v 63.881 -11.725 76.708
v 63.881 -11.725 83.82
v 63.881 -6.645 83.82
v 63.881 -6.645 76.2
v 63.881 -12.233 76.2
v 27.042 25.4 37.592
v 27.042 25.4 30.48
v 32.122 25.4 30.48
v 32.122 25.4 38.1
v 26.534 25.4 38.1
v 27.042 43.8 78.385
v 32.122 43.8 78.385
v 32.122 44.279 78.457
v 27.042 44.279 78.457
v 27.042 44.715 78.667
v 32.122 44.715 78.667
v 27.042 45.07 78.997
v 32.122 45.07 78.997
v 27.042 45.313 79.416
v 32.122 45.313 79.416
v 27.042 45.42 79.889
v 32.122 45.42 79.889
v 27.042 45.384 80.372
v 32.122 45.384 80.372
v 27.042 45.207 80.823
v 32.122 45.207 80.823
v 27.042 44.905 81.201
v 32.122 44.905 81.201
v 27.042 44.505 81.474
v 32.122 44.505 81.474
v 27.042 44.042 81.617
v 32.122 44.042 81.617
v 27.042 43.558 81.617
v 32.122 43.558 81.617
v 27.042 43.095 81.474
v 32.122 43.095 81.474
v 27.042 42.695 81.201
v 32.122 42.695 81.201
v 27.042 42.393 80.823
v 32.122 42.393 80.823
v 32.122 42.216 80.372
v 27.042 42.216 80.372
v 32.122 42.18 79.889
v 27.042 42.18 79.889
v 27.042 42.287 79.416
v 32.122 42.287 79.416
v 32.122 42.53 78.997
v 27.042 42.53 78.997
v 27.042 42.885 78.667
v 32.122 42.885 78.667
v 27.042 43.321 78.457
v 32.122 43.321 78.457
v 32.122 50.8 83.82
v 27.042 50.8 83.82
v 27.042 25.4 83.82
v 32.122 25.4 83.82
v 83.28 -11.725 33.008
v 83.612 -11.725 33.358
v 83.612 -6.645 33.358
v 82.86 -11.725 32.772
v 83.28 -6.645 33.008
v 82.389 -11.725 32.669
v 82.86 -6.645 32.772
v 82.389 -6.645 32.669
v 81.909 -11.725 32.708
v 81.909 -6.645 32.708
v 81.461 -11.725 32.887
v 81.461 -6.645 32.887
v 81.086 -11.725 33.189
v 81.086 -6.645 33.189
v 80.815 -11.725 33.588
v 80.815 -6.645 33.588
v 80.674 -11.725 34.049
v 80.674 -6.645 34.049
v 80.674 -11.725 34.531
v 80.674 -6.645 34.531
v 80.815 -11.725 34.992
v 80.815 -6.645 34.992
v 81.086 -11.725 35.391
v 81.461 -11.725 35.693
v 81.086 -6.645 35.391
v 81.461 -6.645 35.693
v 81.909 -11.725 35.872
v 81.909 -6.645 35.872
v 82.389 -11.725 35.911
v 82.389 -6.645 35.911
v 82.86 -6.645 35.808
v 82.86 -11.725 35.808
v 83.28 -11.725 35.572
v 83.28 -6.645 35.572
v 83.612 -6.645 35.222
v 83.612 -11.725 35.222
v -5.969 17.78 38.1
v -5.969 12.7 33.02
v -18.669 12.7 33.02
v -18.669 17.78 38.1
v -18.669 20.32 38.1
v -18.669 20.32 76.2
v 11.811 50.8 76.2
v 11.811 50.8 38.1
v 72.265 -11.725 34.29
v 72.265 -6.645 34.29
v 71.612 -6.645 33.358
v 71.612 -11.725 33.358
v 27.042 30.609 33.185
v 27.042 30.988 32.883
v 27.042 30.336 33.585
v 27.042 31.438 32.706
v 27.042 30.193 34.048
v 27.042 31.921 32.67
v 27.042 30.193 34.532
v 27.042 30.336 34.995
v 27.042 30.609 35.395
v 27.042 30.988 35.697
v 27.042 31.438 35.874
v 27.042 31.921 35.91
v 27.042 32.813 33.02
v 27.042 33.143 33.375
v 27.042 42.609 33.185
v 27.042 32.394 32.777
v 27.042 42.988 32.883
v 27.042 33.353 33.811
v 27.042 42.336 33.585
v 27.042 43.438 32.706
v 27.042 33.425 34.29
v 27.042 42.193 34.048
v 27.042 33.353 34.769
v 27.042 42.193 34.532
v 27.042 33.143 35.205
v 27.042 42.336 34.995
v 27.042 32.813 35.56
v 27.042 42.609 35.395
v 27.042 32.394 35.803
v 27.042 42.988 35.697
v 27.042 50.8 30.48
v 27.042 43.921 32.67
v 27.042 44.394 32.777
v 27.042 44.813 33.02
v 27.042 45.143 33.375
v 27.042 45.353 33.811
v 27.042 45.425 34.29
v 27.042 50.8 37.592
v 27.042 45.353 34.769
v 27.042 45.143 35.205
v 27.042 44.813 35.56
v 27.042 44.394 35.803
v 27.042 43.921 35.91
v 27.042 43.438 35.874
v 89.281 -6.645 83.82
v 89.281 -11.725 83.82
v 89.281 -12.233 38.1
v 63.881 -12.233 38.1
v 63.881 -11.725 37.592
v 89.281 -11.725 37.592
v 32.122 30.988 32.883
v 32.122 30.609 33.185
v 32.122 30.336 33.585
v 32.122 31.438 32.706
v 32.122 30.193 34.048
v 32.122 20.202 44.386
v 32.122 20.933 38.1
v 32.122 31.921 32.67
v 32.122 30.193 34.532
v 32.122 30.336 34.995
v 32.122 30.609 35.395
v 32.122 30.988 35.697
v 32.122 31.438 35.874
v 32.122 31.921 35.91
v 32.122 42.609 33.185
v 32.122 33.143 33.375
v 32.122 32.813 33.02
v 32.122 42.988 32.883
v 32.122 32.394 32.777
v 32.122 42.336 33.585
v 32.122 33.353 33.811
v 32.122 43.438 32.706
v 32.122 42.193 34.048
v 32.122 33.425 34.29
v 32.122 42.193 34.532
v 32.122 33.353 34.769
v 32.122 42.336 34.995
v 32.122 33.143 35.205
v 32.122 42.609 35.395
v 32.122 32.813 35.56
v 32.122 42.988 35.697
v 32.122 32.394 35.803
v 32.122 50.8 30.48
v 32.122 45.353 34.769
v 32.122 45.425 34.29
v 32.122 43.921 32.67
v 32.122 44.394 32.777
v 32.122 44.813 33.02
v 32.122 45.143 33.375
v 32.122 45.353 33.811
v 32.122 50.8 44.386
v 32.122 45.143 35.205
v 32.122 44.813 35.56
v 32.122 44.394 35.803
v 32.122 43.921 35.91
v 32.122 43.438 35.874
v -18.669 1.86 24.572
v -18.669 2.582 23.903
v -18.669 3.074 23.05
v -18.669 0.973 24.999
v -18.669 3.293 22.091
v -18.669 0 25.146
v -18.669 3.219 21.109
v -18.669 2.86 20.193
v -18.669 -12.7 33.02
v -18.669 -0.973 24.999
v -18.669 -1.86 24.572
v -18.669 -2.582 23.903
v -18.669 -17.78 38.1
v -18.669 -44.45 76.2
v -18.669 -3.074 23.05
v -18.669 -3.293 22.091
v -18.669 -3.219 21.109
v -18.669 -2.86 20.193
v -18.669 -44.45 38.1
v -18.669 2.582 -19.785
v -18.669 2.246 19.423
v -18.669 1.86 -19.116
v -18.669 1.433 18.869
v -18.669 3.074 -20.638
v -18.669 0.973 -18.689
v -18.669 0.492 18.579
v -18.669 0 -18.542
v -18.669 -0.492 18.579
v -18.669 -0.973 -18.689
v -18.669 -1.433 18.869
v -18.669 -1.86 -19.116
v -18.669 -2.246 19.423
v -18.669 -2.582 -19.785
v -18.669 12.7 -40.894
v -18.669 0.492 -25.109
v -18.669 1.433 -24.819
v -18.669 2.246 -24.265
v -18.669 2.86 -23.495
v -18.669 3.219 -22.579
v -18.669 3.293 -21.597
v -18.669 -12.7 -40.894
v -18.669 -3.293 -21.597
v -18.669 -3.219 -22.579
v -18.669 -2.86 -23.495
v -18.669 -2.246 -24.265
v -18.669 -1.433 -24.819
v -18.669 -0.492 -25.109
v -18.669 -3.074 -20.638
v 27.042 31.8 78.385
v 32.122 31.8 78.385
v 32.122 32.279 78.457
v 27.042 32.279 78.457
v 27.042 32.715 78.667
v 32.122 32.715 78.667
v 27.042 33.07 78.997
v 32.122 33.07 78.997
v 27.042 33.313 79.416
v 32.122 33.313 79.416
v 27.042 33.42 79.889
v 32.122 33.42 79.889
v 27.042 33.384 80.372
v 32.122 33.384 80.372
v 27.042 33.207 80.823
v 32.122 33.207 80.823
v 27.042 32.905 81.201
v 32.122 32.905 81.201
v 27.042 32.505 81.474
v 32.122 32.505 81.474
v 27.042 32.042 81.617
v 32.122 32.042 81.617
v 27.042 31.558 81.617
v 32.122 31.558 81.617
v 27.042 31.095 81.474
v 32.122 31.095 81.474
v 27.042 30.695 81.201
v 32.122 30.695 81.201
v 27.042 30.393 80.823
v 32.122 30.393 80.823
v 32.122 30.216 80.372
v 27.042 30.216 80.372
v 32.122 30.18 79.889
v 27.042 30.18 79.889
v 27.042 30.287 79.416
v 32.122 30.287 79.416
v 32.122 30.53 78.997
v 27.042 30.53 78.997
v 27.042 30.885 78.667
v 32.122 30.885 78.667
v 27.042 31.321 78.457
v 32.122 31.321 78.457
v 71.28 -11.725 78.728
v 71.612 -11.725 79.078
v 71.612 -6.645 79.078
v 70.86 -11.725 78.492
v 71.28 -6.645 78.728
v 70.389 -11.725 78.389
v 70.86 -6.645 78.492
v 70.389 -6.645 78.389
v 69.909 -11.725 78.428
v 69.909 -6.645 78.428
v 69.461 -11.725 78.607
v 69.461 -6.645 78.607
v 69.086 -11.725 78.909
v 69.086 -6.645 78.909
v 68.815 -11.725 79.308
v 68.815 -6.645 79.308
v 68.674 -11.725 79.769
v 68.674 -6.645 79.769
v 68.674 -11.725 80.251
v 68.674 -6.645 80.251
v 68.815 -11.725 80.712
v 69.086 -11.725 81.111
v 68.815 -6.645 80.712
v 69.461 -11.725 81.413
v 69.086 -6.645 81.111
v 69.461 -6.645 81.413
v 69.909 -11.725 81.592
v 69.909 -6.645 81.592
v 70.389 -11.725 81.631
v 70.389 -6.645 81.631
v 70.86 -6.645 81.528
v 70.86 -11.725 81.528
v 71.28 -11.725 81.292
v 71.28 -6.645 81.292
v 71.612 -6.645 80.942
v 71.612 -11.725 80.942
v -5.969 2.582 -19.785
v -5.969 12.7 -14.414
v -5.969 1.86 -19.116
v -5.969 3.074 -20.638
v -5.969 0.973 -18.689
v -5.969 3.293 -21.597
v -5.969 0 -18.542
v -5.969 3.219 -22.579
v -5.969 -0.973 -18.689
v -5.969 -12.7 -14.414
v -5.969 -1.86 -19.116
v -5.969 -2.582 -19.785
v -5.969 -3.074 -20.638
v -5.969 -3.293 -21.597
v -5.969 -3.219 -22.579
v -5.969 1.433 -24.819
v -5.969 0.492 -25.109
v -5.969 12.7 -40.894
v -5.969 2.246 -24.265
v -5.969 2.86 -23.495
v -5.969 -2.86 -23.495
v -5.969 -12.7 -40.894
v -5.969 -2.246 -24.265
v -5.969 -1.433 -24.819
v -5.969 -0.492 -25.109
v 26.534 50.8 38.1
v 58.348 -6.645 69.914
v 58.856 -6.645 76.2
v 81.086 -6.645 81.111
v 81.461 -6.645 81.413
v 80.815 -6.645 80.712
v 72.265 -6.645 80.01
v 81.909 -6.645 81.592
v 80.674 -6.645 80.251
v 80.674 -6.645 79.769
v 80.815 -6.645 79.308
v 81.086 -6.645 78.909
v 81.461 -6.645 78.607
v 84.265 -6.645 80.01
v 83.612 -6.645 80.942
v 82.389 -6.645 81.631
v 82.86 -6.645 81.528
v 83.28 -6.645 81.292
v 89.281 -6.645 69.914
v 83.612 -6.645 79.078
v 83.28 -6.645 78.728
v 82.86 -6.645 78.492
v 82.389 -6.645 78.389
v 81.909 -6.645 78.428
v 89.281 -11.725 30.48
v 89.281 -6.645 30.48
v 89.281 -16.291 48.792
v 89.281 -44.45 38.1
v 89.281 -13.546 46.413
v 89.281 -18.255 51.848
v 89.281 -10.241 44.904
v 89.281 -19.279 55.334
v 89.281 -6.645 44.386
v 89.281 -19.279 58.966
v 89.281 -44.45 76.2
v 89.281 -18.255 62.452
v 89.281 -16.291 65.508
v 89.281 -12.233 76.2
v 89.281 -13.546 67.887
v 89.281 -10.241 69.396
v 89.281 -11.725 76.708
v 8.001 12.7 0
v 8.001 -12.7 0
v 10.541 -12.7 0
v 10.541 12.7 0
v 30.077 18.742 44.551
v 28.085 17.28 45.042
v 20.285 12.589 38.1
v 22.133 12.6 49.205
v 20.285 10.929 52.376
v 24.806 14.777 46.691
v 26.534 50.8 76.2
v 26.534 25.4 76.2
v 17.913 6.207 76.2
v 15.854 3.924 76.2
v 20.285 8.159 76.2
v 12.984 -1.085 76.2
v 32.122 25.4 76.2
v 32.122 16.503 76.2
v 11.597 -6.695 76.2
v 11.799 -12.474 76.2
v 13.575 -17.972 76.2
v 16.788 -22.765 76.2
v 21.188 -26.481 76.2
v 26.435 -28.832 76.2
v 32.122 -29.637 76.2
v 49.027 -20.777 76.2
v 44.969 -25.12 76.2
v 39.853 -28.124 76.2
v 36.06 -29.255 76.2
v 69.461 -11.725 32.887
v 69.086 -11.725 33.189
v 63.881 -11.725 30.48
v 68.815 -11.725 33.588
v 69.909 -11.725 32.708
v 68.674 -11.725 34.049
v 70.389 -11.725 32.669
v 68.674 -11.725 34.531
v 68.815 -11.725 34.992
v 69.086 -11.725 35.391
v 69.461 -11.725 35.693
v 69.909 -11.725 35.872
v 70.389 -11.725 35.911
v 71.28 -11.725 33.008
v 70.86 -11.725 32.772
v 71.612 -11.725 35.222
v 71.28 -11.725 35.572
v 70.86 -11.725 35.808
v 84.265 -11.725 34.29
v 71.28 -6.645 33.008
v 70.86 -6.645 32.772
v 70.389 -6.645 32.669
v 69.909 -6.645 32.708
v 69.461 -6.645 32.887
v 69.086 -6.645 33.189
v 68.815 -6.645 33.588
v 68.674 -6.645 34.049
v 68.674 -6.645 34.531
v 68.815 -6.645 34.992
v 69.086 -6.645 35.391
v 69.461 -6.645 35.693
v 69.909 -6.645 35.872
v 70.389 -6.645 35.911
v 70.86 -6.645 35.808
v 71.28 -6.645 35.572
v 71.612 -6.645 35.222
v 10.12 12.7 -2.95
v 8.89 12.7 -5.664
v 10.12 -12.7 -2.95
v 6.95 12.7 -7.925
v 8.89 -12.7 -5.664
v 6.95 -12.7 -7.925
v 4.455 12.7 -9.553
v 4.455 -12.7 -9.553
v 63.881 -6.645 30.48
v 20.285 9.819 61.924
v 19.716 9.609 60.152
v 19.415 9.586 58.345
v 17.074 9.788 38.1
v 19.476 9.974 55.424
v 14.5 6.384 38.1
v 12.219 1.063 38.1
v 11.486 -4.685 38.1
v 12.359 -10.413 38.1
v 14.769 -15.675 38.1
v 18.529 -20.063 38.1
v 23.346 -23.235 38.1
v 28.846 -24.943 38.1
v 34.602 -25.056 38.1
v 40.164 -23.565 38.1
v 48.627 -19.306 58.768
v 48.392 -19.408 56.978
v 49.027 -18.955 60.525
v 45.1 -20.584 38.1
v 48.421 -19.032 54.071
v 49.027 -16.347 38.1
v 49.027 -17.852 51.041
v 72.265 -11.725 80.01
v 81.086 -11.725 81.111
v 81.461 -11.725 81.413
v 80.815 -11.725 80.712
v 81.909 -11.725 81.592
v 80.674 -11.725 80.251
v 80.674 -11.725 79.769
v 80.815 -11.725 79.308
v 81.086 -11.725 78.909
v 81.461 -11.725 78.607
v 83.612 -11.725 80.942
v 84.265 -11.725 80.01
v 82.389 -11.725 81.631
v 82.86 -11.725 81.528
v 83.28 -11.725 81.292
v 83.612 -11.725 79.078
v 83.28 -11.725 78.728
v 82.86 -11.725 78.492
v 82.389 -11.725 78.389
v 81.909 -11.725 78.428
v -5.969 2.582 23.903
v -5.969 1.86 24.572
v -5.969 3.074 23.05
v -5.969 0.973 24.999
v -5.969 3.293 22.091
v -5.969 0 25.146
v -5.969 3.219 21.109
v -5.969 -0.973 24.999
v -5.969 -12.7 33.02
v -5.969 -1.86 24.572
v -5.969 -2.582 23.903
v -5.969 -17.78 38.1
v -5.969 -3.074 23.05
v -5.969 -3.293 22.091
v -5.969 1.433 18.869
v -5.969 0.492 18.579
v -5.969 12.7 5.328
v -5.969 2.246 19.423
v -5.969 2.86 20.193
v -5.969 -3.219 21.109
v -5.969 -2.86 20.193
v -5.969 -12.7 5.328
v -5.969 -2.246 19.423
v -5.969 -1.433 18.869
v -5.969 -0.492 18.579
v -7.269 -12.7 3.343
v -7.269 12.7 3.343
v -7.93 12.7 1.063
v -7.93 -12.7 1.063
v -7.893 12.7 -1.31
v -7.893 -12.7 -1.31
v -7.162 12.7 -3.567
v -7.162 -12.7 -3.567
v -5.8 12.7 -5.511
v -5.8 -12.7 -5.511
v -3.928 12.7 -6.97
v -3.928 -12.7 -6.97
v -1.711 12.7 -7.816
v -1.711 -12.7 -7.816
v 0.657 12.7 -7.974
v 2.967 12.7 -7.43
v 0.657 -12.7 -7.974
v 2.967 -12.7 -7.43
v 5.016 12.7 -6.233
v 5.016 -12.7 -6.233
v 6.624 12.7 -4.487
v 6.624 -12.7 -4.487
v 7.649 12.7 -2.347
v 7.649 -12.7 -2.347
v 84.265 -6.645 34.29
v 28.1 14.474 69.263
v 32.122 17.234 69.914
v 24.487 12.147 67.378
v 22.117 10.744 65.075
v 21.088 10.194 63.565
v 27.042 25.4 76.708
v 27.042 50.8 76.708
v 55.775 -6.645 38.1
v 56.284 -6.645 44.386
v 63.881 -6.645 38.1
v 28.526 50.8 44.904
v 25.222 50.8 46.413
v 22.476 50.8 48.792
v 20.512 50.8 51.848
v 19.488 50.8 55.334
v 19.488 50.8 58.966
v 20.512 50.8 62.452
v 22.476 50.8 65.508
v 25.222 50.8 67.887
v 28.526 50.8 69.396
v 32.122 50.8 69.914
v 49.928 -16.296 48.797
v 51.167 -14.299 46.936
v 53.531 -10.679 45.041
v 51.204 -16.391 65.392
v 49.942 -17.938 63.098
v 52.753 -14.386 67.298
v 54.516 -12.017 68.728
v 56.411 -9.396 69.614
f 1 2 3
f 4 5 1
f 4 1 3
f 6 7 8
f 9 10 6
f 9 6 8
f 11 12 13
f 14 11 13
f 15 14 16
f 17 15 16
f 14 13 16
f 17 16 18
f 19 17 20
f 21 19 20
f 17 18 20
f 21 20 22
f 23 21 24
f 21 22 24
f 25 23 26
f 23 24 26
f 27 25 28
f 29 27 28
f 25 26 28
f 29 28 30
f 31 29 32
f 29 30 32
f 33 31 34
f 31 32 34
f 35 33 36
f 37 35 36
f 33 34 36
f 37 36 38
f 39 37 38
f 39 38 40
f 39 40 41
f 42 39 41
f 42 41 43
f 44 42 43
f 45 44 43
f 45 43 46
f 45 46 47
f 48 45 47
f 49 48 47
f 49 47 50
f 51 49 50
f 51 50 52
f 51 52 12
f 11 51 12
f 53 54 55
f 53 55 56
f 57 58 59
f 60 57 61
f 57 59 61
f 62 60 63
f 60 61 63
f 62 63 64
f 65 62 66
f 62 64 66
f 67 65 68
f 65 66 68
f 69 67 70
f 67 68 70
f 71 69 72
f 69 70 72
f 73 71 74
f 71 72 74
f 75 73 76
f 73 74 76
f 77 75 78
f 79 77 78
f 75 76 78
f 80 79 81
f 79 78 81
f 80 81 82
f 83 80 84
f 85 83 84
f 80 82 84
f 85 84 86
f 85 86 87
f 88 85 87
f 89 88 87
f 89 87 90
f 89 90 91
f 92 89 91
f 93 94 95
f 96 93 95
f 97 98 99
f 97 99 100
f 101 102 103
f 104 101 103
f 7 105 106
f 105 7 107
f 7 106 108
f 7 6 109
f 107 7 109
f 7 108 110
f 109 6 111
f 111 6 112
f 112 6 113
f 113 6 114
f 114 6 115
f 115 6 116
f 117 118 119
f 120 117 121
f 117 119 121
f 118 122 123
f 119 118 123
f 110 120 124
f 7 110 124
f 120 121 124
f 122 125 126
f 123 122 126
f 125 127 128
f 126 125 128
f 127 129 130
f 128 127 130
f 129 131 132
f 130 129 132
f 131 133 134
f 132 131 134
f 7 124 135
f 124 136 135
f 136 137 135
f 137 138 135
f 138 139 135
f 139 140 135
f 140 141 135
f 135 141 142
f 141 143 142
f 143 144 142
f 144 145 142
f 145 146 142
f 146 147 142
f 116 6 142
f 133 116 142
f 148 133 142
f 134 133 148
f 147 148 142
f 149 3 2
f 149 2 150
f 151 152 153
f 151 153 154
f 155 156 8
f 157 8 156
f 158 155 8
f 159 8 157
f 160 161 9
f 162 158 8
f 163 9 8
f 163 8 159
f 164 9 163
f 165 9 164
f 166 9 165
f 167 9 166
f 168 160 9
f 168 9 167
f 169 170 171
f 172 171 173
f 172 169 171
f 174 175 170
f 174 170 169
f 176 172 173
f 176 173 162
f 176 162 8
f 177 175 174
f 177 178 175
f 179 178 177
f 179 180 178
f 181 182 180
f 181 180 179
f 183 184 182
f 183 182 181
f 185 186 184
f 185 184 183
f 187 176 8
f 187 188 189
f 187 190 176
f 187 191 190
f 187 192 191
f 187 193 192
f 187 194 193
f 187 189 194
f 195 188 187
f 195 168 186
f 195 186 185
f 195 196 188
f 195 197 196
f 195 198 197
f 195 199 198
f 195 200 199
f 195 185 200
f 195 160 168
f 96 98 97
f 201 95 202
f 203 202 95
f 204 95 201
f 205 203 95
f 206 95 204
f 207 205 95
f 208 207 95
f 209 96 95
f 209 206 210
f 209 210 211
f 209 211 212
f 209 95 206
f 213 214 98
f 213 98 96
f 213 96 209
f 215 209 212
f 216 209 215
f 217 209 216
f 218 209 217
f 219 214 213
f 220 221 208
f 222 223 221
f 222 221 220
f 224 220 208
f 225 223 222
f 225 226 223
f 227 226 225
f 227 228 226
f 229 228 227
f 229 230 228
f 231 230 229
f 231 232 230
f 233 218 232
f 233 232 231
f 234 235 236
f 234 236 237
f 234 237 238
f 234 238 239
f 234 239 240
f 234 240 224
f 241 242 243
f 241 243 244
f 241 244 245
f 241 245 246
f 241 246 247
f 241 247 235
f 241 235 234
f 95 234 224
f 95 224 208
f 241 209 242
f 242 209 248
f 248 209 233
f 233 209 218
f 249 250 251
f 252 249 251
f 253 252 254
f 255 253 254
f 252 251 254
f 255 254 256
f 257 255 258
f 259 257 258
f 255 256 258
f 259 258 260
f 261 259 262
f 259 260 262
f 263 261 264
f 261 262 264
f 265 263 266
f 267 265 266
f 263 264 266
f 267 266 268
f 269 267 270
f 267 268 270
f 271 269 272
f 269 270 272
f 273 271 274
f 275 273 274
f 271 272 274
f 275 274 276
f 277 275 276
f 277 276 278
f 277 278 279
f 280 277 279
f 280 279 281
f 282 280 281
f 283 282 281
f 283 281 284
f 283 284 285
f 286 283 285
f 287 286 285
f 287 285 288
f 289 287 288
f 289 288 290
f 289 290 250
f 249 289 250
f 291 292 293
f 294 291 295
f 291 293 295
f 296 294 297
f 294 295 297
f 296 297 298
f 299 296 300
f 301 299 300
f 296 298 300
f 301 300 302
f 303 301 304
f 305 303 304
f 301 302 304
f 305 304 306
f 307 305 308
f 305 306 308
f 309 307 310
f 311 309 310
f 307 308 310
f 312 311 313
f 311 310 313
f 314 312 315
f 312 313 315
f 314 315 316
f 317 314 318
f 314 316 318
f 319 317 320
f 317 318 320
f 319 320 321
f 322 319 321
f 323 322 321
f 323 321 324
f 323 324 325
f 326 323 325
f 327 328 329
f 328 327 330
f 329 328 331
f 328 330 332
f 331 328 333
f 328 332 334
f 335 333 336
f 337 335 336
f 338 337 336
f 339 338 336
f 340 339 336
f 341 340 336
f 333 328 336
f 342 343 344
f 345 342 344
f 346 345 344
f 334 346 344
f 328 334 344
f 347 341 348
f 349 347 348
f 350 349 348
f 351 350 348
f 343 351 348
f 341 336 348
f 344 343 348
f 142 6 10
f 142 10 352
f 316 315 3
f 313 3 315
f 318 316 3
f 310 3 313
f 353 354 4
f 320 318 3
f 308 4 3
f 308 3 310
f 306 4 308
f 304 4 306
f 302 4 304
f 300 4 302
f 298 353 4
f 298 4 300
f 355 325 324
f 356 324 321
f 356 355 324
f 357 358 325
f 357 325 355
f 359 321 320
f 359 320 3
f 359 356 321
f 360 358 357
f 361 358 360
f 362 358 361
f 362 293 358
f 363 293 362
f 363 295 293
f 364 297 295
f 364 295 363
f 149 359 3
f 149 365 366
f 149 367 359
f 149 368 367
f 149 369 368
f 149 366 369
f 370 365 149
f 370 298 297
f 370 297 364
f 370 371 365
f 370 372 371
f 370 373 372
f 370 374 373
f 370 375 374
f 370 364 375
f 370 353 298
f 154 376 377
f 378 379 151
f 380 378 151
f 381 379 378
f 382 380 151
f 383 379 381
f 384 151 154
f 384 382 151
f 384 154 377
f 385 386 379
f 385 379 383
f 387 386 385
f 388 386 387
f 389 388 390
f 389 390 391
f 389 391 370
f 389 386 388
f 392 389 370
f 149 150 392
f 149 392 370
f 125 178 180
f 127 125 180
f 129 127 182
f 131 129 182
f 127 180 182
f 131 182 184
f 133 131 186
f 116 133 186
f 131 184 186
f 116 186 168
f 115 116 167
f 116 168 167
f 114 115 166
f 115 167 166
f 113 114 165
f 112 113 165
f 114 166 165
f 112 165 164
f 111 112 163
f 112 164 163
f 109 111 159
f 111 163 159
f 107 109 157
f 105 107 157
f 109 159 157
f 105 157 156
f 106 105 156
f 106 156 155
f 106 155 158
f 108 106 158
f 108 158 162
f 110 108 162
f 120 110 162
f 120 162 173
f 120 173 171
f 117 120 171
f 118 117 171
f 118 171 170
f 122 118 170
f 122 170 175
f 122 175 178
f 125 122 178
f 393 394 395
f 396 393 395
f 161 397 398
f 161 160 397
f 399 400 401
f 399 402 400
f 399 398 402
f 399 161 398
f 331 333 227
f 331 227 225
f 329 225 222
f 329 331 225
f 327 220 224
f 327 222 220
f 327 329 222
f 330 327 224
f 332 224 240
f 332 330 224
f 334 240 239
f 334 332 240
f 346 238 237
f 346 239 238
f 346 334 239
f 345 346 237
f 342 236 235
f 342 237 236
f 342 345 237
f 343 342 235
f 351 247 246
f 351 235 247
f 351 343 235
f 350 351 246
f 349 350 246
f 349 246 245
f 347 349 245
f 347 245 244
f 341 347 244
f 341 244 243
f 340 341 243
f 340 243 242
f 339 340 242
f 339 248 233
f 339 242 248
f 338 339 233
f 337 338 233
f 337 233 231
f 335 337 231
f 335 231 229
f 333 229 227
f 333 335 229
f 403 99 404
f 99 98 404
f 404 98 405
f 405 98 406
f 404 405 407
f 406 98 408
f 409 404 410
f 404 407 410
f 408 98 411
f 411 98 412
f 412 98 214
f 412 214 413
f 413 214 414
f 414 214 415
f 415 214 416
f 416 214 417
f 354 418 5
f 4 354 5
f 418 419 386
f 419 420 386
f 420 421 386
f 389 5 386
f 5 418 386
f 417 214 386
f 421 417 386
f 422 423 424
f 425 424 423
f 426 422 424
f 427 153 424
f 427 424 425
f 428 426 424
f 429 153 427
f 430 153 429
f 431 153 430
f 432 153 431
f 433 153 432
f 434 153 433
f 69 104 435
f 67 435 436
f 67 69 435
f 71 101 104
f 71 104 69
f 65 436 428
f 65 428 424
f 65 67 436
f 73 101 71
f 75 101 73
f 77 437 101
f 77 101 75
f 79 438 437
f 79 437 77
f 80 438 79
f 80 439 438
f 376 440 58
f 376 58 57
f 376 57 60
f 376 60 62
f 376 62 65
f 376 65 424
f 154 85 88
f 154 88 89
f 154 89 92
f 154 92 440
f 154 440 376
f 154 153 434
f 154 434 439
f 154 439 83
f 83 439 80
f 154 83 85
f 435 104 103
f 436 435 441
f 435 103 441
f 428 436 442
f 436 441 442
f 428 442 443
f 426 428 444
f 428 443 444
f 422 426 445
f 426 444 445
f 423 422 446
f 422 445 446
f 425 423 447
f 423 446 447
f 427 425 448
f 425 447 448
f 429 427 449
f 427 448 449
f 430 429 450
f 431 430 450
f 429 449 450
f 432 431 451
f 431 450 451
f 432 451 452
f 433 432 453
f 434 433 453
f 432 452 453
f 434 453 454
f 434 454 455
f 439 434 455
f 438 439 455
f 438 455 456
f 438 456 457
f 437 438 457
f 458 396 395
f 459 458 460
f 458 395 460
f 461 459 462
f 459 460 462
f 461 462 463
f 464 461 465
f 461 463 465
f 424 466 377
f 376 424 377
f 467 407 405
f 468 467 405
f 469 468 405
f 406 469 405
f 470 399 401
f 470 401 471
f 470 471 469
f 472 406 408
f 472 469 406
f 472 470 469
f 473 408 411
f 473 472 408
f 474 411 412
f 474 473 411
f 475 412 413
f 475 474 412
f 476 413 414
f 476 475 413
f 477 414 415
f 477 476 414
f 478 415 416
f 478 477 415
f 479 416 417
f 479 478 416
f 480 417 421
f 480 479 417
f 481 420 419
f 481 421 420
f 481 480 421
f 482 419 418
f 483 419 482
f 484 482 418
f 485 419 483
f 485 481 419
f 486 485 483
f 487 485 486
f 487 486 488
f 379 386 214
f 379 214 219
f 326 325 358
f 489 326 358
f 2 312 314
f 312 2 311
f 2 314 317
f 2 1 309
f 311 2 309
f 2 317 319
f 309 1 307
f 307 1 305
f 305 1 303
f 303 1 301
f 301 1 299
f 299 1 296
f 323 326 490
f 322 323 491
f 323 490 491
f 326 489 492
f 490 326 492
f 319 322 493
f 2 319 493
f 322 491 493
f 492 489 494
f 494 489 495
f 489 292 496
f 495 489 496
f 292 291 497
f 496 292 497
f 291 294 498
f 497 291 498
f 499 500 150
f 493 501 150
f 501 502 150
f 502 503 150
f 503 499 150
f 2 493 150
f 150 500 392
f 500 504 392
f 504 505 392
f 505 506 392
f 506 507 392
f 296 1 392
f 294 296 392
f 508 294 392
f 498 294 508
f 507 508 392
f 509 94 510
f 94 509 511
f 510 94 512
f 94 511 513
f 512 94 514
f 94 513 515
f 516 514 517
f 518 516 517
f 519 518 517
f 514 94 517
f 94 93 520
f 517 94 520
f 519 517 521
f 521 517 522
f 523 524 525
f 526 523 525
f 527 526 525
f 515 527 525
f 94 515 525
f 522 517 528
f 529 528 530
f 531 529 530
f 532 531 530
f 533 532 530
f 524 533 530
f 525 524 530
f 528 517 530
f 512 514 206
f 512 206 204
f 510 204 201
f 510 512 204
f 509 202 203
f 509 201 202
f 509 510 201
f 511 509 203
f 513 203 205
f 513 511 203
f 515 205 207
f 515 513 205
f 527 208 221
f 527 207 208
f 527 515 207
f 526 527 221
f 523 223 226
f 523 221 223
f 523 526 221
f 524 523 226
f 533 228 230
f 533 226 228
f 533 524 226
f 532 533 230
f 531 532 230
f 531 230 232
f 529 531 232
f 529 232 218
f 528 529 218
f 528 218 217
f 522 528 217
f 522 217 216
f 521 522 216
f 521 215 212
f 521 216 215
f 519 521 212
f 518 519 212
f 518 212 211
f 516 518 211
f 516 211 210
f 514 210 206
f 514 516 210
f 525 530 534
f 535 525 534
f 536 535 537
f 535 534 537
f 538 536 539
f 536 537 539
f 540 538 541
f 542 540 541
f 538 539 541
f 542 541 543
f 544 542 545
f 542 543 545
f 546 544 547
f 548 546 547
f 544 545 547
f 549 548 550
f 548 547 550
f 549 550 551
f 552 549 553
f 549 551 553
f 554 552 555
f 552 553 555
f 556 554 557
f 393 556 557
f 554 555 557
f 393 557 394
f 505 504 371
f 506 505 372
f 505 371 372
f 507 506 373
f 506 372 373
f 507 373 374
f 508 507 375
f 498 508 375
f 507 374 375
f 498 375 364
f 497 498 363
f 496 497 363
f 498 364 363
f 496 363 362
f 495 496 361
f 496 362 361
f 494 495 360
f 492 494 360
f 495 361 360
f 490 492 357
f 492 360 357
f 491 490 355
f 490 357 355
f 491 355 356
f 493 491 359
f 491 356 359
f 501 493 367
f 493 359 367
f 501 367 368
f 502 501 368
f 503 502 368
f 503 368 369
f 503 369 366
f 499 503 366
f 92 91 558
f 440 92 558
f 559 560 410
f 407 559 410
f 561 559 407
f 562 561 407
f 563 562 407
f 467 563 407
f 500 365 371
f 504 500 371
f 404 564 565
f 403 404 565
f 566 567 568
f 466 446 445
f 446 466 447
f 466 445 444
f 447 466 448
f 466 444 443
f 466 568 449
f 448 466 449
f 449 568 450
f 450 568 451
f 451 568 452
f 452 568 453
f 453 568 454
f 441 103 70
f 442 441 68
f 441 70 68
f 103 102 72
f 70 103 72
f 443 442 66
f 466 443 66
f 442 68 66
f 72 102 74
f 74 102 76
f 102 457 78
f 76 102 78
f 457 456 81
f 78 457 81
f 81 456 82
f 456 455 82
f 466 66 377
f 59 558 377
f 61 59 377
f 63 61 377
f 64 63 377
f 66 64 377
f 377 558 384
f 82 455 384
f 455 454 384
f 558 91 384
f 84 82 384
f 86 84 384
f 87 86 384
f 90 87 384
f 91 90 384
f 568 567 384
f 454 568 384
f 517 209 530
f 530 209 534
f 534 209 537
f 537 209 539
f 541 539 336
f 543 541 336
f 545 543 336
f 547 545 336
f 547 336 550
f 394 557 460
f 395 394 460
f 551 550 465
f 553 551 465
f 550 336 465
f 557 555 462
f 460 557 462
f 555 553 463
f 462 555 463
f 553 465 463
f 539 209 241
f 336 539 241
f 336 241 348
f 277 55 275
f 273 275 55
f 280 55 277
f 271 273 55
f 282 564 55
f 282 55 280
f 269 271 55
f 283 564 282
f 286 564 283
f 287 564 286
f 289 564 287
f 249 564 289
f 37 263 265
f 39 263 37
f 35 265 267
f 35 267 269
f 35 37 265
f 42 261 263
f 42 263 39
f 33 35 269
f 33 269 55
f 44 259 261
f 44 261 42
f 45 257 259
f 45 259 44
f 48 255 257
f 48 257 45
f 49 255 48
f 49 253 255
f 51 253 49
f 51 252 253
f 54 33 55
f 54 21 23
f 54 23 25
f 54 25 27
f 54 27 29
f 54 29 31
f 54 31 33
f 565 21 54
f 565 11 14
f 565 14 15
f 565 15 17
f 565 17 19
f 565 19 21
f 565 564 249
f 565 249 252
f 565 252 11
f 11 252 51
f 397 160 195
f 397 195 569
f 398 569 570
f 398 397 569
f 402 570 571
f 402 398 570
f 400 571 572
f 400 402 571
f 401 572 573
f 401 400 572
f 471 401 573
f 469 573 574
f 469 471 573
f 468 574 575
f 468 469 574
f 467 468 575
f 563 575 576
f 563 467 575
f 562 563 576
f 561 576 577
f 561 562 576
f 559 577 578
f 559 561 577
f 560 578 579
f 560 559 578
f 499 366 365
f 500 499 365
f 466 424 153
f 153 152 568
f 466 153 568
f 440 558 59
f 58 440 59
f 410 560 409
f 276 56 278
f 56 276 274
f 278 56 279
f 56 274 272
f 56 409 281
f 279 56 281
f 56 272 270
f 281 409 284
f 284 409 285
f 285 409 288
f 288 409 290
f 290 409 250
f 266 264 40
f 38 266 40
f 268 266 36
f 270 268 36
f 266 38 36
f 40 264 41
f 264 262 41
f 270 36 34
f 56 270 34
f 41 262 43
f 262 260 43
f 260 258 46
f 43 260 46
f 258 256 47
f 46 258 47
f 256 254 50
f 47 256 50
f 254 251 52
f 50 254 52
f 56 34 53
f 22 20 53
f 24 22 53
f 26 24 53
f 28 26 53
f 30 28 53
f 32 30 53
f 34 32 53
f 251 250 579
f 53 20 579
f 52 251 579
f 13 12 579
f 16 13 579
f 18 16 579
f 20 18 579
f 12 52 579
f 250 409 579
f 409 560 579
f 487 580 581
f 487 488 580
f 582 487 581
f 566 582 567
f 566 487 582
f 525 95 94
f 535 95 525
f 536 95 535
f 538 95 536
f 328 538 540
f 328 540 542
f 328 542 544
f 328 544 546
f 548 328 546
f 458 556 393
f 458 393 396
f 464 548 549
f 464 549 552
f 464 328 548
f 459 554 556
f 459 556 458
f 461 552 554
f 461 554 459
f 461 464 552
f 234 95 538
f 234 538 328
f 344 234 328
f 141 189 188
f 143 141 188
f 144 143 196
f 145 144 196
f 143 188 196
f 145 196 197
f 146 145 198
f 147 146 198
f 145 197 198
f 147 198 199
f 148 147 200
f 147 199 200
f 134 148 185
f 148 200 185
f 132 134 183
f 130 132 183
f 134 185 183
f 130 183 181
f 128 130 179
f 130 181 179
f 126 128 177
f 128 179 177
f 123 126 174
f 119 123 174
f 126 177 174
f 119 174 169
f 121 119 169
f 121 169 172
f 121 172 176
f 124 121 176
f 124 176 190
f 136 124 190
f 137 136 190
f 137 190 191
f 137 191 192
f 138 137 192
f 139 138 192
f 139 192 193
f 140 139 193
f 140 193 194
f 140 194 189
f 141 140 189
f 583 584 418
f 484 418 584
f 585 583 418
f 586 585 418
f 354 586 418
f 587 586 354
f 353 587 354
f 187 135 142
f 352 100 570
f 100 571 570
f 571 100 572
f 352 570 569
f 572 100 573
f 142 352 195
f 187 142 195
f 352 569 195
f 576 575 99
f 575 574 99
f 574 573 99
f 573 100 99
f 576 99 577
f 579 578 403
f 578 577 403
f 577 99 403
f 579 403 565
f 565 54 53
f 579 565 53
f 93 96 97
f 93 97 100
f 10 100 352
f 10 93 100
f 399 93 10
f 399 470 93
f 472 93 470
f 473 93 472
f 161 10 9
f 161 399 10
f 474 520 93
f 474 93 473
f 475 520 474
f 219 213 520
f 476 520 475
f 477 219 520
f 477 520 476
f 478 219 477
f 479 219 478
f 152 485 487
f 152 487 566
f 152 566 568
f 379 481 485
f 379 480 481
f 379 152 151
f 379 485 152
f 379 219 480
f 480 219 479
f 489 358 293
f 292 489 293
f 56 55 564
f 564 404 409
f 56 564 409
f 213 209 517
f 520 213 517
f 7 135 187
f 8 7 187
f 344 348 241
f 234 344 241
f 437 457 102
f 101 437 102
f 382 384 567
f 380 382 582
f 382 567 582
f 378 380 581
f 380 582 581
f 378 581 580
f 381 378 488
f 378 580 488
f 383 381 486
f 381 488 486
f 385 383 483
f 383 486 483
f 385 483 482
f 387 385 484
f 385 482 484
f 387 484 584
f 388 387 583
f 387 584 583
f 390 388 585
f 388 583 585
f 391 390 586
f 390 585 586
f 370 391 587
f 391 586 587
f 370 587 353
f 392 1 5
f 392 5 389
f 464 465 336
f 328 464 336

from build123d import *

# Parameters (mm, degrees)
BOSS_EXTRUDE1_DEPTH                       = 12.7
BOSS_EXTRUDE1_DEPTH_BACK                  = 12.7
CUT_EXTRUDE1_DEPTH                        = 83.589067678
CUT_EXTRUDE1_DEPTH_BACK                   = 83.589067678
SKETCH5_R                                 = 3.302
BOSS_EXTRUDE_START                        = -12.7
SKETCH10_W                                = 12.7
SKETCH10_H                                = 38.1
BOSS_EXTRUDE_ARM_FB_WIDTH_DEPTH           = 44.45
BOSS_EXTRUDE_ARM_CHASSIS_FB_DEPTH         = 95.25
SKETCH15_W                                = 55.88
SKETCH15_H                                = 38.1
BOSS_EXTRUDE_ARM_CHASSIS_LR_DEPTH         = 50.8
SKETCH16_R                                = 12.7635
CUT_EXTRUDE_CHASSIS_FB_DEPTH              = 128.199614864
SKETCH17_R                                = 12.7635
SKETCH17_W                                = 12.7635
SKETCH17_H                                = 38.1
CUT_EXTRUDE_CHASSIS_LR_DEPTH              = 128.199614864
CUT_EXTRUDE_START                         = -22.107857563
CUT_EXTRUDE_CHASSIS_JOINT_CLEARANCE_DEPTH = 43.685920391
SKETCH19_W                                = 25.4
SKETCH19_H                                = 5.08
BOSS_EXTRUDE_FB_CLAMP_TOP_DEPTH           = 7.62
BOSS_EXTRUDE_START_2                      = -38.1
SKETCH19_3_W                              = 25.4
SKETCH19_3_H                              = 5.08
BOSS_EXTRUDE_FB_CLAMP_BOTTOM_DEPTH        = 7.62
SKETCH20_W                                = 5.08
SKETCH20_H                                = 25.4
BOSS_EXTRUDE_LR_CLAMP_TOP_DEPTH           = 7.62
SKETCH20_3_W                              = 5.08
SKETCH20_3_H                              = 25.4
BOSS_EXTRUDE_LR_CLAMP_BOTTOM_DEPTH        = 7.62
CHAMFER1_SIZE                             = 0.508
CHAMFER2_SIZE                             = 30.48
CHAMFER7_SIZE                             = 5.08
SKETCH26_FB_CLAMP_HOLES_R                 = 1.625000052
CUT_EXTRUDE7_FB_HOLES_DEPTH               = 136.265877047
SKETCH23_LR_CLAMP_HOLES_R                 = 1.625000052
CUT_EXTRUDE8_FB_HOLES_DEPTH               = 114.46180152
CHAMFER8_SIZE                             = 0.508


# Read off the part's stored shape, not the designer's step: Cut-Extrude Chassis Joint Clearance
with BuildPart() as part:
    # Sketch3 → Boss-Extrude1 (new, two sides: drawn at the far end of the back side and taken through both)
    with BuildSketch(Plane(origin=(0, 0, 0), x_dir=(1, 0, 0), z_dir=(0, 1, 0)).offset(-BOSS_EXTRUDE1_DEPTH_BACK)):
        with BuildLine():
            Line((8.001, 0), (10.541, 0))
            ThreePointArc((10.541, 0), (8.89018923, 5.663675172), (4.454819097, 9.553390383))
            Line((4.454819097, 9.553390383), (-5.969, 14.414097055))
            Line((-5.969, 14.414097055), (-5.969, 40.894))
            Line((-5.969, 40.894), (-18.669, 40.894))
            Line((-18.669, 40.894), (-18.669, -76.2))
            Line((-18.669, -76.2), (-5.969, -76.2))
            Line((-5.969, -76.2), (-5.969, -5.327948949))
            ThreePointArc((-5.969, -5.327948949), (-2.851142929, 7.475759828), (8.001, 0))
        make_face()
    extrude(amount=BOSS_EXTRUDE1_DEPTH + BOSS_EXTRUDE1_DEPTH_BACK)

    # Sketch5 → Cut-Extrude1 (cut, two sides: drawn at the far end of the back side and taken through both)
    with BuildSketch(Plane.ZY.offset(18.669).offset(-CUT_EXTRUDE1_DEPTH_BACK)):
        with Locations((-21.844, 0)):
            Circle(SKETCH5_R)
        with Locations((21.844, 0)):
            Circle(SKETCH5_R)
    extrude(amount=CUT_EXTRUDE1_DEPTH + CUT_EXTRUDE1_DEPTH_BACK, mode=Mode.SUBTRACT)

    # Sketch10 → Boss-Extrude Arm FB Width (add)
    with BuildSketch(Plane.XZ.offset(12.7).offset(BOSS_EXTRUDE_START)):
        with Locations((-12.319, 57.15)):
            Rectangle(SKETCH10_W, SKETCH10_H)
    extrude(amount=BOSS_EXTRUDE_ARM_FB_WIDTH_DEPTH)

    # Sketch12 → Boss-Extrude Arm Chassis FB (add)
    with BuildSketch(Plane(origin=(-5.969, 0, 0), x_dir=(0, 0, -1), z_dir=(1, 0, 0))):
        Polygon((-38.1, 0), (-76.2, 0), (-76.2, -44.45), (-38.1, -44.45), (-38.1, -12.7), align=None)
    extrude(amount=BOSS_EXTRUDE_ARM_CHASSIS_FB_DEPTH)

    # Sketch15 → Boss-Extrude Arm Chassis LR (add)
    with BuildSketch(Plane(origin=(0, 0, 0), x_dir=(1, 0, 0), z_dir=(0, 1, 0))):
        with Locations((9.271, -57.15)):
            Rectangle(SKETCH15_W, SKETCH15_H)
    extrude(amount=BOSS_EXTRUDE_ARM_CHASSIS_LR_DEPTH)

    # Sketch16 → Cut-Extrude Chassis FB (cut, through all)
    with BuildSketch(Plane(origin=(32.122028853, -6.645348837, 57.15), x_dir=(0, 0, 1), z_dir=(-1, 0, 0))):
        Circle(SKETCH16_R)
        with BuildLine():
            Line((-19.05, 0), (-12.7635, 0))
            ThreePointArc((-12.7635, 0), (-9.025157412, 9.025157392), (-2.9e-08, 12.7635))
            Line((-2.9e-08, 12.7635), (-19.05, 12.7635))
            Line((-19.05, 12.7635), (-19.05, 0))
        make_face()
        with BuildLine():
            ThreePointArc((-2.9e-08, 12.7635), (9.025157392, 9.025157412), (12.7635, 0))
            Line((12.7635, 0), (19.05, 0))
            Line((19.05, 0), (19.05, 12.7635))
            Line((19.05, 12.7635), (-2.9e-08, 12.7635))
        make_face()
    extrude(amount=-CUT_EXTRUDE_CHASSIS_FB_DEPTH, mode=Mode.SUBTRACT)

    # Sketch17 → Cut-Extrude Chassis LR (cut, through all)
    with BuildSketch(Plane(origin=(32.122028853, -6.645348837, 57.15), x_dir=(1, 0, 0), z_dir=(0, 1, 0))):
        Circle(SKETCH17_R)
        with Locations((6.38175, 0)):
            Rectangle(SKETCH17_W, SKETCH17_H)
    extrude(amount=CUT_EXTRUDE_CHASSIS_LR_DEPTH, mode=Mode.SUBTRACT)

    # Cut-Extrude Chassis Joint Clearance outl → Cut-Extrude Chassis Joint Clearance (cut)
    with BuildSketch(Plane(origin=(0, 1.051977093, 58.045037899), x_dir=(1, 0, 0), z_dir=(0, -0.11550085817456393, 0.9933073803012538)).offset(CUT_EXTRUDE_START)):
        with BuildLine():
            Line((65.60424969, 4.087995405), (49.027279167, 4.087995405))
            ThreePointArc((49.027279167, 4.087995405), (41.651365859, 10.55649777), (32.122028853, 12.8883117))
            Line((32.122028853, 12.8883117), (32.122028853, 17.444547275))
            Line((32.122028853, 17.444547275), (20.284845148, 9.156062014))
            ThreePointArc((20.284845148, 9.156062014), (17.529112657, -22.342104497), (49.027279167, -19.586372005))
            Line((49.027279167, -19.586372005), (65.60424969, 4.087995405))
        make_face()
    extrude(amount=CUT_EXTRUDE_CHASSIS_JOINT_CLEARANCE_DEPTH, mode=Mode.SUBTRACT)

    # Sketch19 → Boss-Extrude FB Clamp Top (add)
    with BuildSketch(Plane.XY.offset(76.2)):
        with Locations((76.581, -9.185348837)):
            Rectangle(SKETCH19_W, SKETCH19_H)
    extrude(amount=BOSS_EXTRUDE_FB_CLAMP_TOP_DEPTH)

    # Sketch19<3> → Boss-Extrude FB Clamp Bottom (add)
    with BuildSketch(Plane.XY.offset(76.2).offset(BOSS_EXTRUDE_START_2)):
        with Locations((76.581, -9.185348837)):
            Rectangle(SKETCH19_3_W, SKETCH19_3_H)
    extrude(amount=-BOSS_EXTRUDE_FB_CLAMP_BOTTOM_DEPTH)

    # Sketch20 → Boss-Extrude LR Clamp Top (add)
    with BuildSketch(Plane.XY.offset(76.2)):
        with Locations((29.582028853, 38.1)):
            Rectangle(SKETCH20_W, SKETCH20_H)
    extrude(amount=BOSS_EXTRUDE_LR_CLAMP_TOP_DEPTH)

    # Sketch20<3> → Boss-Extrude LR Clamp Bottom (add)
    with BuildSketch(Plane.XY.offset(76.2).offset(BOSS_EXTRUDE_START_2)):
        with Locations((29.582028853, 38.1)):
            Rectangle(SKETCH20_3_W, SKETCH20_3_H)
    extrude(amount=-BOSS_EXTRUDE_LR_CLAMP_BOTTOM_DEPTH)

    # Chamfer1
    chamfer1_edges = [part.edges().sort_by_distance(p)[0] for p in [
        (76.581, -11.725348837, 76.2),
        (76.581, -11.725348837, 38.1),
    ]]
    chamfer(chamfer1_edges, length=CHAMFER1_SIZE)

    # Chamfer2
    chamfer2_edges = [part.edges().sort_by_distance(p)[0] for p in [
        (-18.669, 50.8, 57.15),
    ]]
    chamfer(chamfer2_edges, length=CHAMFER2_SIZE)

    # Chamfer7
    chamfer7_edges = [part.edges().sort_by_distance(p)[0] for p in [
        (-12.319, 12.7, 38.1),
        (-12.319, -12.7, 38.1),
    ]]
    chamfer(chamfer7_edges, length=CHAMFER7_SIZE)

    # Sketch26 FB Clamp Holes → Cut-Extrude7 FB Holes (cut, through all)
    with BuildSketch(Plane(origin=(0, -6.645348837, 0), x_dir=(1, 0, 0), z_dir=(0, 1, 0))):
        with Locations((70.281000154, -80.01)):
            Circle(SKETCH26_FB_CLAMP_HOLES_R)
        with BuildLine():
            Line((72.264758924, -80.01), (71.612122269, -79.077938261))
            ThreePointArc((71.612122269, -79.077938261), (71.830790249, -79.52135306), (71.906000206, -80.01))
            ThreePointArc((71.906000206, -80.01), (71.830790249, -80.49864694), (71.612122269, -80.942061739))
            Line((71.612122269, -80.942061739), (72.264758924, -80.01))
        make_face()
        with BuildLine():
            Line((84.2647588, -80.01), (83.612122145, -79.077938261))
            ThreePointArc((83.612122145, -79.077938261), (83.830790125, -79.52135306), (83.906000082, -80.01))
            ThreePointArc((83.906000082, -80.01), (83.830790125, -80.49864694), (83.612122145, -80.942061739))
            Line((83.612122145, -80.942061739), (84.2647588, -80.01))
        make_face()
        with Locations((82.28100003, -80.01)):
            Circle(SKETCH26_FB_CLAMP_HOLES_R)
        with BuildLine():
            Line((84.2647588, -34.29), (83.612122145, -33.357938261))
            ThreePointArc((83.612122145, -33.357938261), (83.830790125, -33.80135306), (83.906000082, -34.29))
            ThreePointArc((83.906000082, -34.29), (83.830790125, -34.77864694), (83.612122145, -35.222061739))
            Line((83.612122145, -35.222061739), (84.2647588, -34.29))
        make_face()
        with Locations((82.28100003, -34.29)):
            Circle(SKETCH26_FB_CLAMP_HOLES_R)
        with BuildLine():
            Line((72.264758924, -34.29), (71.612122269, -33.357938261))
            ThreePointArc((71.612122269, -33.357938261), (71.830790249, -33.80135306), (71.906000206, -34.29))
            ThreePointArc((71.906000206, -34.29), (71.830790249, -34.77864694), (71.612122269, -35.222061739))
            Line((71.612122269, -35.222061739), (72.264758924, -34.29))
        make_face()
        with Locations((70.281000154, -34.29)):
            Circle(SKETCH26_FB_CLAMP_HOLES_R)
    extrude(amount=-CUT_EXTRUDE7_FB_HOLES_DEPTH, mode=Mode.SUBTRACT)

    # Sketch23 LR Clamp Holes → Cut-Extrude8 FB Holes (cut, through all)
    with BuildSketch(Plane(origin=(32.122028853, 0, 0), x_dir=(0, 0, -1), z_dir=(1, 0, 0))):
        with Locations((-80.01, 43.80000003)):
            Circle(SKETCH23_LR_CLAMP_HOLES_R)
        with Locations((-80.01, 31.800000154)):
            Circle(SKETCH23_LR_CLAMP_HOLES_R)
        with Locations(Location((-34.29, 31.800000154, 0), (0, 0, 90))):
            Circle(SKETCH23_LR_CLAMP_HOLES_R)
        with Locations(Location((-34.29, 43.80000003, 0), (0, 0, 90))):
            Circle(SKETCH23_LR_CLAMP_HOLES_R)
    extrude(amount=-CUT_EXTRUDE8_FB_HOLES_DEPTH, mode=Mode.SUBTRACT)

    # Chamfer8
    chamfer8_edges = [part.edges().sort_by_distance(p)[0] for p in [
        (27.042028853, 38.1, 76.2),
        (27.042028853, 38.1, 38.1),
    ]]
    chamfer(chamfer8_edges, length=CHAMFER8_SIZE)


solid = part.part
